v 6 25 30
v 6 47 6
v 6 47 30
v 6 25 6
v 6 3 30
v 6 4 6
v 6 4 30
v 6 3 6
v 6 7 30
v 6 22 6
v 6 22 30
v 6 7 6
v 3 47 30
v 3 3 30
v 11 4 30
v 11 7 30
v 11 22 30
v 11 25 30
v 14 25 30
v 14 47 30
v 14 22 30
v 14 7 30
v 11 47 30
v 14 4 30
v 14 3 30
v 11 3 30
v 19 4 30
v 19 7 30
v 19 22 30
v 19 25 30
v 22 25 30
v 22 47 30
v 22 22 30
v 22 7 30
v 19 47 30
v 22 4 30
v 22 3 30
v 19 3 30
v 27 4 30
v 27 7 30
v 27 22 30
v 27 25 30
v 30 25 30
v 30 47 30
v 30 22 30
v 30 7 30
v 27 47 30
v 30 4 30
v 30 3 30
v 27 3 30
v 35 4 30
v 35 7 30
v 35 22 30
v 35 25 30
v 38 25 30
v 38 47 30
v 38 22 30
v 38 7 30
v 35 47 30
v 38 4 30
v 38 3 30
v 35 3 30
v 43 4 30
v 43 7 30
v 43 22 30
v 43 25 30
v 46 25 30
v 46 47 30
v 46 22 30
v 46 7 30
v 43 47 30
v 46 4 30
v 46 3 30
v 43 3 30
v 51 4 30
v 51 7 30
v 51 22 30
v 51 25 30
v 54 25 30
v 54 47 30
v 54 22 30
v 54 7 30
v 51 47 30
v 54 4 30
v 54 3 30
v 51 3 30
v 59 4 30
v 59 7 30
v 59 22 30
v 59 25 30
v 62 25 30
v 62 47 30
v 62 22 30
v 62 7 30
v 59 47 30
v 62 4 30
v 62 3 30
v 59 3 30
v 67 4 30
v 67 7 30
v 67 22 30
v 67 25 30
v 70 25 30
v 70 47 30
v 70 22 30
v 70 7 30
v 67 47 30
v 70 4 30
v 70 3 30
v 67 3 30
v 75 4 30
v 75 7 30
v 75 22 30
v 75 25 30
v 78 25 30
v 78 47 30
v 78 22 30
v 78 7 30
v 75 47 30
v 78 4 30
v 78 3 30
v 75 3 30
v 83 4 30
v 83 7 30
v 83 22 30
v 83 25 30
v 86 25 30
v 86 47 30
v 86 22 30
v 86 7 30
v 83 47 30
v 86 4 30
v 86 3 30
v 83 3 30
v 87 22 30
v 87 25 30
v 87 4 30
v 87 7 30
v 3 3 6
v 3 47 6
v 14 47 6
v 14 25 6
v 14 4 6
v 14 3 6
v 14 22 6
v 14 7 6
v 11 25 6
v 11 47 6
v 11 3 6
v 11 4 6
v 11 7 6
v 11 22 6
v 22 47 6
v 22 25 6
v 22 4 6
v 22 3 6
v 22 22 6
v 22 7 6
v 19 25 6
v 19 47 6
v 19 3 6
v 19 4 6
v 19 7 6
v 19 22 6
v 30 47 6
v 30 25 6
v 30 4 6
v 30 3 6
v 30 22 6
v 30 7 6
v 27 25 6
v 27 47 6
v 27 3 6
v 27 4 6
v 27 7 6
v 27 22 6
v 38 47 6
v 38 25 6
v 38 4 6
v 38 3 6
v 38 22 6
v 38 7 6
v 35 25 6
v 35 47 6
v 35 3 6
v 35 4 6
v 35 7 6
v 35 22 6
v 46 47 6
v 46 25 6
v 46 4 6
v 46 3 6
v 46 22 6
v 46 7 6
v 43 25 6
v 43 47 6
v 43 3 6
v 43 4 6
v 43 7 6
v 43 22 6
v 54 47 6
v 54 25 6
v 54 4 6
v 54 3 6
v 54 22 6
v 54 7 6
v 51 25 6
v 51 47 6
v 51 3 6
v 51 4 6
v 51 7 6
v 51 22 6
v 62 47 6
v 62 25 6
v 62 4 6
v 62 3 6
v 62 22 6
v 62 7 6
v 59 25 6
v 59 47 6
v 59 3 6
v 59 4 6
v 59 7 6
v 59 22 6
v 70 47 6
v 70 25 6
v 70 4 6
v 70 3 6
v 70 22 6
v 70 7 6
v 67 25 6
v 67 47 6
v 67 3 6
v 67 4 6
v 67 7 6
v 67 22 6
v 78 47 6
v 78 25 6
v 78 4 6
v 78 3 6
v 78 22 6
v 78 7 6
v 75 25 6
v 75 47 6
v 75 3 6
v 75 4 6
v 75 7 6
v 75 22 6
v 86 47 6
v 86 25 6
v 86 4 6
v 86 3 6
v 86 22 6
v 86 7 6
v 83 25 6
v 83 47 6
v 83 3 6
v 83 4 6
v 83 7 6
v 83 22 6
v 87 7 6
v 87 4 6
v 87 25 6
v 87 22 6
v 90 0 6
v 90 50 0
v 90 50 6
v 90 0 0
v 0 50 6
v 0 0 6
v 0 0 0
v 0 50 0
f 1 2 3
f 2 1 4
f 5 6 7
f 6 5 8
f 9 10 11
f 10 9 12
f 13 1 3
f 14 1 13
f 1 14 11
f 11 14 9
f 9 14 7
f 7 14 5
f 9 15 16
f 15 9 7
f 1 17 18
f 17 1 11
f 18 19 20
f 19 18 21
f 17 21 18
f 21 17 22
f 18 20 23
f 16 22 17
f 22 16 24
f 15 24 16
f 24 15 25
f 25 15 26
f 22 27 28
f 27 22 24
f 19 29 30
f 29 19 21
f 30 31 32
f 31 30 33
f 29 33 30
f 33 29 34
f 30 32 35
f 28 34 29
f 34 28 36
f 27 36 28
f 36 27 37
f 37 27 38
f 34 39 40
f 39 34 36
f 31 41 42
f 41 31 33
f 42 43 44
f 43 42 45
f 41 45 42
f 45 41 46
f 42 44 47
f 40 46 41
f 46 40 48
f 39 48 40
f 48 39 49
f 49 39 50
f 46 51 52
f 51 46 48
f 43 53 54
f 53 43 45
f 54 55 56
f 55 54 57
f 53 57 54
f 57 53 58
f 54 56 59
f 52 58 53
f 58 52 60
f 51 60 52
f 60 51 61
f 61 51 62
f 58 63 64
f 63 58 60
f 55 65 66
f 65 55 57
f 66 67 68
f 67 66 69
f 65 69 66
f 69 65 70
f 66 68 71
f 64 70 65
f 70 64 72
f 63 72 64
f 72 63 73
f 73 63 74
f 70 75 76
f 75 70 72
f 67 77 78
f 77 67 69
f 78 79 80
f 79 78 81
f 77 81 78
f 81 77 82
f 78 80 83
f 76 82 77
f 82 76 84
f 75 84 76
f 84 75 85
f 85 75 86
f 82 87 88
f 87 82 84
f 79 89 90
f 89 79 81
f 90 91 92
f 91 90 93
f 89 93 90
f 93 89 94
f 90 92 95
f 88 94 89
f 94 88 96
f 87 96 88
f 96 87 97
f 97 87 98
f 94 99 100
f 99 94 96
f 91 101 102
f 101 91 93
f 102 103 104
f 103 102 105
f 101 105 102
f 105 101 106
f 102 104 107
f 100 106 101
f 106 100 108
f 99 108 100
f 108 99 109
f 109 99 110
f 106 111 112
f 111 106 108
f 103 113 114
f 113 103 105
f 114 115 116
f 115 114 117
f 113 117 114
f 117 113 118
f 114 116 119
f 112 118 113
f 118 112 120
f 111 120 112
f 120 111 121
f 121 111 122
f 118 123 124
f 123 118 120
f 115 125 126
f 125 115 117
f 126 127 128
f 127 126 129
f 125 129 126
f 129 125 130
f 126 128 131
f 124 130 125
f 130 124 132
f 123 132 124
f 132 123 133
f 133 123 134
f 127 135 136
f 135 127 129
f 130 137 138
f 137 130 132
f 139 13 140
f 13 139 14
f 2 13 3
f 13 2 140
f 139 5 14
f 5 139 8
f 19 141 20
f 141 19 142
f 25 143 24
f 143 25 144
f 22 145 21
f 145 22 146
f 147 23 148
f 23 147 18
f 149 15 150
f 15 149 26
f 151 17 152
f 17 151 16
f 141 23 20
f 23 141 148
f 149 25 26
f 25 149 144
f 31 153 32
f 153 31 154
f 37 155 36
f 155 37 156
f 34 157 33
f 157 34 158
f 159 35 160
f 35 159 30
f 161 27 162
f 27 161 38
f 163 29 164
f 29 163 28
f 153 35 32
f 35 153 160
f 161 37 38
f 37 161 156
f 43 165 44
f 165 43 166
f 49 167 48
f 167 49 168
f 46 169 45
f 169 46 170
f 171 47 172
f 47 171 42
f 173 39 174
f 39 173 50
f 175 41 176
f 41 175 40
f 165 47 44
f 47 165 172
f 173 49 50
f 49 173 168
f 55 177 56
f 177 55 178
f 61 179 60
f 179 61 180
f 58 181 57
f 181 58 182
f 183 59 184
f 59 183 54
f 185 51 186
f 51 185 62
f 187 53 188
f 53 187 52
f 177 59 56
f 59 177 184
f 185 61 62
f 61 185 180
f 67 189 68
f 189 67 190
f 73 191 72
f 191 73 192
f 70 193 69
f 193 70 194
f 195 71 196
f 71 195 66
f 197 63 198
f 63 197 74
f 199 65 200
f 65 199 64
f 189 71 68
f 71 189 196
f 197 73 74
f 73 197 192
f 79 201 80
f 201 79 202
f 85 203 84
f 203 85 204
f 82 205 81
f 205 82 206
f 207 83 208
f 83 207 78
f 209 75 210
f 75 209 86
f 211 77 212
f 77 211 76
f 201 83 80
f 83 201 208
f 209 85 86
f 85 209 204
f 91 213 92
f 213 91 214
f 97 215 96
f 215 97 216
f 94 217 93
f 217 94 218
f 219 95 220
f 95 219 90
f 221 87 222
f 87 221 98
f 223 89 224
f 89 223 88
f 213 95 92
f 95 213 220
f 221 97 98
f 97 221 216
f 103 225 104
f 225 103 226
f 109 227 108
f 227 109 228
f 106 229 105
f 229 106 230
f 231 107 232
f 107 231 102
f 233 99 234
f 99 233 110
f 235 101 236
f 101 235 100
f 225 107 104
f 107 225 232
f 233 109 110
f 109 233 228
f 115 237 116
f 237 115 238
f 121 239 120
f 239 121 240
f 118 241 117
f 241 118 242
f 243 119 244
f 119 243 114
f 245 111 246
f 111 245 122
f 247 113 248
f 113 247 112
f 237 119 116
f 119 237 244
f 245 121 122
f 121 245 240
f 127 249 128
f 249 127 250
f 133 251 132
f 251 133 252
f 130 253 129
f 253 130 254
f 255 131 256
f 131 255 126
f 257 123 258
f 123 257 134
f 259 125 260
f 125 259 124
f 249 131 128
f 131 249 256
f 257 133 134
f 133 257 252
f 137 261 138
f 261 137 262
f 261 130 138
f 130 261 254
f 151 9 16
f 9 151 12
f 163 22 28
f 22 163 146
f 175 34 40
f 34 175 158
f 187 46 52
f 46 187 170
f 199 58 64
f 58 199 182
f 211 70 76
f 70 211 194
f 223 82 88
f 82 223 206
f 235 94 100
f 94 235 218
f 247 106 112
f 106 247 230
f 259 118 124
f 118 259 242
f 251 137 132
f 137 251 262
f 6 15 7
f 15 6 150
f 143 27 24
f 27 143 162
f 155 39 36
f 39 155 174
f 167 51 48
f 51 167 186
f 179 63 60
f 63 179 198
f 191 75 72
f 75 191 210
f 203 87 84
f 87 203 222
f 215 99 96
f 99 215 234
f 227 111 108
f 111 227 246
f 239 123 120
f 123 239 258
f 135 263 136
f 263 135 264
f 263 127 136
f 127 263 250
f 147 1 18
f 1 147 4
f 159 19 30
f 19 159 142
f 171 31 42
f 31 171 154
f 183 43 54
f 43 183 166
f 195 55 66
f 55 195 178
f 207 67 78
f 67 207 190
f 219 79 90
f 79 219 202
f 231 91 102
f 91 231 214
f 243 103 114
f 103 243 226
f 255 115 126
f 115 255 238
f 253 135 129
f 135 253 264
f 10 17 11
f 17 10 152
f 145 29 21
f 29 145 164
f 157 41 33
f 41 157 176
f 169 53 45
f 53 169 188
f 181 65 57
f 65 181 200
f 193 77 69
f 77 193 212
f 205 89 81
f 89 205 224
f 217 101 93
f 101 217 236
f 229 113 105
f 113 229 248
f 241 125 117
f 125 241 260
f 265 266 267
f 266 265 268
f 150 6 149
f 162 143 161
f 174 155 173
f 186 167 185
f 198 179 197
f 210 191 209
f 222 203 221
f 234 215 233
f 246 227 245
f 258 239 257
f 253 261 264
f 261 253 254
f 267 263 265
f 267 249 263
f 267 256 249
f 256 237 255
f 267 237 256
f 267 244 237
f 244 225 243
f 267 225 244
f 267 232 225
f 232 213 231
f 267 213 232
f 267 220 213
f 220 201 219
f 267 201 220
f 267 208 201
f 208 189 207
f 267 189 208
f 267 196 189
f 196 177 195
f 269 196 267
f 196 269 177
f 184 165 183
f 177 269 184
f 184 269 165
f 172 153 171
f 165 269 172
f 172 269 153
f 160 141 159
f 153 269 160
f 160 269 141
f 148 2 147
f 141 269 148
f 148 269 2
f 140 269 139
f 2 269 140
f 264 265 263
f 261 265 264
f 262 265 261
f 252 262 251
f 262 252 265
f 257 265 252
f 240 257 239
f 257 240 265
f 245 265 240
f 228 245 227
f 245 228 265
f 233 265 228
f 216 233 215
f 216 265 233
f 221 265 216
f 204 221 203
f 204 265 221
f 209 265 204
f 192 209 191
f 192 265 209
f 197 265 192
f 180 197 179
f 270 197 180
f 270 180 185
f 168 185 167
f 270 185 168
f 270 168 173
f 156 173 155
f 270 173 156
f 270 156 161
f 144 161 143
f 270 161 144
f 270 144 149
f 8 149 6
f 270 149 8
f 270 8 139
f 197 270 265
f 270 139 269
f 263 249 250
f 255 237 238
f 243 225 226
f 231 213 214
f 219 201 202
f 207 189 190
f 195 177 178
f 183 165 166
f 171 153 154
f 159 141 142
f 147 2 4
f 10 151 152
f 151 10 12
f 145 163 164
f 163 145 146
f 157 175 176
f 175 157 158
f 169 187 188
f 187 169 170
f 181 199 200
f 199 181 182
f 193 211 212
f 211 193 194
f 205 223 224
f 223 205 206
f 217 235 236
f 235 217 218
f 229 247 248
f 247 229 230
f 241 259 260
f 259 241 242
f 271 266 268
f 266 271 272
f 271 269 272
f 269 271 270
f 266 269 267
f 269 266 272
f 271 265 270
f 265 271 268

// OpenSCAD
$fn = 32;

// ----------------------------------------------------------------------
// Heatsink: cross fin block
// ----------------------------------------------------------------------

// --- parameters (mm) ---
base_l = 90;              // base length, X
base_w = 50;              // base width, Y
base_t = 6;               // base plate thickness
fin_h = 25;               // fin height above the base
fin_t = 3;                // fin thickness
edge = 3;                 // margin from the base ends
pitch = 8;                // fin pitch
rib_pitch = 18;           // cross rib pitch

n_fins = floor((base_l - 2 * edge - fin_t) / pitch) + 1;  // fin count
total_h = base_t + fin_h - 1;  // overall height
n_ribs = floor((base_w - 2 * edge) / rib_pitch);  // rib count

union() {
  cube([base_l, base_w, base_t]);
  for (i = [0 : n_fins - 1])
    translate([edge + i * pitch, edge, base_t - 1])
      cube([fin_t, base_w - 2 * edge, fin_h]);
  for (i = [0 : n_ribs - 1])
    translate([edge, edge + 1 + i * rib_pitch, base_t - 1])
      cube([base_l - 2 * edge, fin_t, fin_h]);
}
